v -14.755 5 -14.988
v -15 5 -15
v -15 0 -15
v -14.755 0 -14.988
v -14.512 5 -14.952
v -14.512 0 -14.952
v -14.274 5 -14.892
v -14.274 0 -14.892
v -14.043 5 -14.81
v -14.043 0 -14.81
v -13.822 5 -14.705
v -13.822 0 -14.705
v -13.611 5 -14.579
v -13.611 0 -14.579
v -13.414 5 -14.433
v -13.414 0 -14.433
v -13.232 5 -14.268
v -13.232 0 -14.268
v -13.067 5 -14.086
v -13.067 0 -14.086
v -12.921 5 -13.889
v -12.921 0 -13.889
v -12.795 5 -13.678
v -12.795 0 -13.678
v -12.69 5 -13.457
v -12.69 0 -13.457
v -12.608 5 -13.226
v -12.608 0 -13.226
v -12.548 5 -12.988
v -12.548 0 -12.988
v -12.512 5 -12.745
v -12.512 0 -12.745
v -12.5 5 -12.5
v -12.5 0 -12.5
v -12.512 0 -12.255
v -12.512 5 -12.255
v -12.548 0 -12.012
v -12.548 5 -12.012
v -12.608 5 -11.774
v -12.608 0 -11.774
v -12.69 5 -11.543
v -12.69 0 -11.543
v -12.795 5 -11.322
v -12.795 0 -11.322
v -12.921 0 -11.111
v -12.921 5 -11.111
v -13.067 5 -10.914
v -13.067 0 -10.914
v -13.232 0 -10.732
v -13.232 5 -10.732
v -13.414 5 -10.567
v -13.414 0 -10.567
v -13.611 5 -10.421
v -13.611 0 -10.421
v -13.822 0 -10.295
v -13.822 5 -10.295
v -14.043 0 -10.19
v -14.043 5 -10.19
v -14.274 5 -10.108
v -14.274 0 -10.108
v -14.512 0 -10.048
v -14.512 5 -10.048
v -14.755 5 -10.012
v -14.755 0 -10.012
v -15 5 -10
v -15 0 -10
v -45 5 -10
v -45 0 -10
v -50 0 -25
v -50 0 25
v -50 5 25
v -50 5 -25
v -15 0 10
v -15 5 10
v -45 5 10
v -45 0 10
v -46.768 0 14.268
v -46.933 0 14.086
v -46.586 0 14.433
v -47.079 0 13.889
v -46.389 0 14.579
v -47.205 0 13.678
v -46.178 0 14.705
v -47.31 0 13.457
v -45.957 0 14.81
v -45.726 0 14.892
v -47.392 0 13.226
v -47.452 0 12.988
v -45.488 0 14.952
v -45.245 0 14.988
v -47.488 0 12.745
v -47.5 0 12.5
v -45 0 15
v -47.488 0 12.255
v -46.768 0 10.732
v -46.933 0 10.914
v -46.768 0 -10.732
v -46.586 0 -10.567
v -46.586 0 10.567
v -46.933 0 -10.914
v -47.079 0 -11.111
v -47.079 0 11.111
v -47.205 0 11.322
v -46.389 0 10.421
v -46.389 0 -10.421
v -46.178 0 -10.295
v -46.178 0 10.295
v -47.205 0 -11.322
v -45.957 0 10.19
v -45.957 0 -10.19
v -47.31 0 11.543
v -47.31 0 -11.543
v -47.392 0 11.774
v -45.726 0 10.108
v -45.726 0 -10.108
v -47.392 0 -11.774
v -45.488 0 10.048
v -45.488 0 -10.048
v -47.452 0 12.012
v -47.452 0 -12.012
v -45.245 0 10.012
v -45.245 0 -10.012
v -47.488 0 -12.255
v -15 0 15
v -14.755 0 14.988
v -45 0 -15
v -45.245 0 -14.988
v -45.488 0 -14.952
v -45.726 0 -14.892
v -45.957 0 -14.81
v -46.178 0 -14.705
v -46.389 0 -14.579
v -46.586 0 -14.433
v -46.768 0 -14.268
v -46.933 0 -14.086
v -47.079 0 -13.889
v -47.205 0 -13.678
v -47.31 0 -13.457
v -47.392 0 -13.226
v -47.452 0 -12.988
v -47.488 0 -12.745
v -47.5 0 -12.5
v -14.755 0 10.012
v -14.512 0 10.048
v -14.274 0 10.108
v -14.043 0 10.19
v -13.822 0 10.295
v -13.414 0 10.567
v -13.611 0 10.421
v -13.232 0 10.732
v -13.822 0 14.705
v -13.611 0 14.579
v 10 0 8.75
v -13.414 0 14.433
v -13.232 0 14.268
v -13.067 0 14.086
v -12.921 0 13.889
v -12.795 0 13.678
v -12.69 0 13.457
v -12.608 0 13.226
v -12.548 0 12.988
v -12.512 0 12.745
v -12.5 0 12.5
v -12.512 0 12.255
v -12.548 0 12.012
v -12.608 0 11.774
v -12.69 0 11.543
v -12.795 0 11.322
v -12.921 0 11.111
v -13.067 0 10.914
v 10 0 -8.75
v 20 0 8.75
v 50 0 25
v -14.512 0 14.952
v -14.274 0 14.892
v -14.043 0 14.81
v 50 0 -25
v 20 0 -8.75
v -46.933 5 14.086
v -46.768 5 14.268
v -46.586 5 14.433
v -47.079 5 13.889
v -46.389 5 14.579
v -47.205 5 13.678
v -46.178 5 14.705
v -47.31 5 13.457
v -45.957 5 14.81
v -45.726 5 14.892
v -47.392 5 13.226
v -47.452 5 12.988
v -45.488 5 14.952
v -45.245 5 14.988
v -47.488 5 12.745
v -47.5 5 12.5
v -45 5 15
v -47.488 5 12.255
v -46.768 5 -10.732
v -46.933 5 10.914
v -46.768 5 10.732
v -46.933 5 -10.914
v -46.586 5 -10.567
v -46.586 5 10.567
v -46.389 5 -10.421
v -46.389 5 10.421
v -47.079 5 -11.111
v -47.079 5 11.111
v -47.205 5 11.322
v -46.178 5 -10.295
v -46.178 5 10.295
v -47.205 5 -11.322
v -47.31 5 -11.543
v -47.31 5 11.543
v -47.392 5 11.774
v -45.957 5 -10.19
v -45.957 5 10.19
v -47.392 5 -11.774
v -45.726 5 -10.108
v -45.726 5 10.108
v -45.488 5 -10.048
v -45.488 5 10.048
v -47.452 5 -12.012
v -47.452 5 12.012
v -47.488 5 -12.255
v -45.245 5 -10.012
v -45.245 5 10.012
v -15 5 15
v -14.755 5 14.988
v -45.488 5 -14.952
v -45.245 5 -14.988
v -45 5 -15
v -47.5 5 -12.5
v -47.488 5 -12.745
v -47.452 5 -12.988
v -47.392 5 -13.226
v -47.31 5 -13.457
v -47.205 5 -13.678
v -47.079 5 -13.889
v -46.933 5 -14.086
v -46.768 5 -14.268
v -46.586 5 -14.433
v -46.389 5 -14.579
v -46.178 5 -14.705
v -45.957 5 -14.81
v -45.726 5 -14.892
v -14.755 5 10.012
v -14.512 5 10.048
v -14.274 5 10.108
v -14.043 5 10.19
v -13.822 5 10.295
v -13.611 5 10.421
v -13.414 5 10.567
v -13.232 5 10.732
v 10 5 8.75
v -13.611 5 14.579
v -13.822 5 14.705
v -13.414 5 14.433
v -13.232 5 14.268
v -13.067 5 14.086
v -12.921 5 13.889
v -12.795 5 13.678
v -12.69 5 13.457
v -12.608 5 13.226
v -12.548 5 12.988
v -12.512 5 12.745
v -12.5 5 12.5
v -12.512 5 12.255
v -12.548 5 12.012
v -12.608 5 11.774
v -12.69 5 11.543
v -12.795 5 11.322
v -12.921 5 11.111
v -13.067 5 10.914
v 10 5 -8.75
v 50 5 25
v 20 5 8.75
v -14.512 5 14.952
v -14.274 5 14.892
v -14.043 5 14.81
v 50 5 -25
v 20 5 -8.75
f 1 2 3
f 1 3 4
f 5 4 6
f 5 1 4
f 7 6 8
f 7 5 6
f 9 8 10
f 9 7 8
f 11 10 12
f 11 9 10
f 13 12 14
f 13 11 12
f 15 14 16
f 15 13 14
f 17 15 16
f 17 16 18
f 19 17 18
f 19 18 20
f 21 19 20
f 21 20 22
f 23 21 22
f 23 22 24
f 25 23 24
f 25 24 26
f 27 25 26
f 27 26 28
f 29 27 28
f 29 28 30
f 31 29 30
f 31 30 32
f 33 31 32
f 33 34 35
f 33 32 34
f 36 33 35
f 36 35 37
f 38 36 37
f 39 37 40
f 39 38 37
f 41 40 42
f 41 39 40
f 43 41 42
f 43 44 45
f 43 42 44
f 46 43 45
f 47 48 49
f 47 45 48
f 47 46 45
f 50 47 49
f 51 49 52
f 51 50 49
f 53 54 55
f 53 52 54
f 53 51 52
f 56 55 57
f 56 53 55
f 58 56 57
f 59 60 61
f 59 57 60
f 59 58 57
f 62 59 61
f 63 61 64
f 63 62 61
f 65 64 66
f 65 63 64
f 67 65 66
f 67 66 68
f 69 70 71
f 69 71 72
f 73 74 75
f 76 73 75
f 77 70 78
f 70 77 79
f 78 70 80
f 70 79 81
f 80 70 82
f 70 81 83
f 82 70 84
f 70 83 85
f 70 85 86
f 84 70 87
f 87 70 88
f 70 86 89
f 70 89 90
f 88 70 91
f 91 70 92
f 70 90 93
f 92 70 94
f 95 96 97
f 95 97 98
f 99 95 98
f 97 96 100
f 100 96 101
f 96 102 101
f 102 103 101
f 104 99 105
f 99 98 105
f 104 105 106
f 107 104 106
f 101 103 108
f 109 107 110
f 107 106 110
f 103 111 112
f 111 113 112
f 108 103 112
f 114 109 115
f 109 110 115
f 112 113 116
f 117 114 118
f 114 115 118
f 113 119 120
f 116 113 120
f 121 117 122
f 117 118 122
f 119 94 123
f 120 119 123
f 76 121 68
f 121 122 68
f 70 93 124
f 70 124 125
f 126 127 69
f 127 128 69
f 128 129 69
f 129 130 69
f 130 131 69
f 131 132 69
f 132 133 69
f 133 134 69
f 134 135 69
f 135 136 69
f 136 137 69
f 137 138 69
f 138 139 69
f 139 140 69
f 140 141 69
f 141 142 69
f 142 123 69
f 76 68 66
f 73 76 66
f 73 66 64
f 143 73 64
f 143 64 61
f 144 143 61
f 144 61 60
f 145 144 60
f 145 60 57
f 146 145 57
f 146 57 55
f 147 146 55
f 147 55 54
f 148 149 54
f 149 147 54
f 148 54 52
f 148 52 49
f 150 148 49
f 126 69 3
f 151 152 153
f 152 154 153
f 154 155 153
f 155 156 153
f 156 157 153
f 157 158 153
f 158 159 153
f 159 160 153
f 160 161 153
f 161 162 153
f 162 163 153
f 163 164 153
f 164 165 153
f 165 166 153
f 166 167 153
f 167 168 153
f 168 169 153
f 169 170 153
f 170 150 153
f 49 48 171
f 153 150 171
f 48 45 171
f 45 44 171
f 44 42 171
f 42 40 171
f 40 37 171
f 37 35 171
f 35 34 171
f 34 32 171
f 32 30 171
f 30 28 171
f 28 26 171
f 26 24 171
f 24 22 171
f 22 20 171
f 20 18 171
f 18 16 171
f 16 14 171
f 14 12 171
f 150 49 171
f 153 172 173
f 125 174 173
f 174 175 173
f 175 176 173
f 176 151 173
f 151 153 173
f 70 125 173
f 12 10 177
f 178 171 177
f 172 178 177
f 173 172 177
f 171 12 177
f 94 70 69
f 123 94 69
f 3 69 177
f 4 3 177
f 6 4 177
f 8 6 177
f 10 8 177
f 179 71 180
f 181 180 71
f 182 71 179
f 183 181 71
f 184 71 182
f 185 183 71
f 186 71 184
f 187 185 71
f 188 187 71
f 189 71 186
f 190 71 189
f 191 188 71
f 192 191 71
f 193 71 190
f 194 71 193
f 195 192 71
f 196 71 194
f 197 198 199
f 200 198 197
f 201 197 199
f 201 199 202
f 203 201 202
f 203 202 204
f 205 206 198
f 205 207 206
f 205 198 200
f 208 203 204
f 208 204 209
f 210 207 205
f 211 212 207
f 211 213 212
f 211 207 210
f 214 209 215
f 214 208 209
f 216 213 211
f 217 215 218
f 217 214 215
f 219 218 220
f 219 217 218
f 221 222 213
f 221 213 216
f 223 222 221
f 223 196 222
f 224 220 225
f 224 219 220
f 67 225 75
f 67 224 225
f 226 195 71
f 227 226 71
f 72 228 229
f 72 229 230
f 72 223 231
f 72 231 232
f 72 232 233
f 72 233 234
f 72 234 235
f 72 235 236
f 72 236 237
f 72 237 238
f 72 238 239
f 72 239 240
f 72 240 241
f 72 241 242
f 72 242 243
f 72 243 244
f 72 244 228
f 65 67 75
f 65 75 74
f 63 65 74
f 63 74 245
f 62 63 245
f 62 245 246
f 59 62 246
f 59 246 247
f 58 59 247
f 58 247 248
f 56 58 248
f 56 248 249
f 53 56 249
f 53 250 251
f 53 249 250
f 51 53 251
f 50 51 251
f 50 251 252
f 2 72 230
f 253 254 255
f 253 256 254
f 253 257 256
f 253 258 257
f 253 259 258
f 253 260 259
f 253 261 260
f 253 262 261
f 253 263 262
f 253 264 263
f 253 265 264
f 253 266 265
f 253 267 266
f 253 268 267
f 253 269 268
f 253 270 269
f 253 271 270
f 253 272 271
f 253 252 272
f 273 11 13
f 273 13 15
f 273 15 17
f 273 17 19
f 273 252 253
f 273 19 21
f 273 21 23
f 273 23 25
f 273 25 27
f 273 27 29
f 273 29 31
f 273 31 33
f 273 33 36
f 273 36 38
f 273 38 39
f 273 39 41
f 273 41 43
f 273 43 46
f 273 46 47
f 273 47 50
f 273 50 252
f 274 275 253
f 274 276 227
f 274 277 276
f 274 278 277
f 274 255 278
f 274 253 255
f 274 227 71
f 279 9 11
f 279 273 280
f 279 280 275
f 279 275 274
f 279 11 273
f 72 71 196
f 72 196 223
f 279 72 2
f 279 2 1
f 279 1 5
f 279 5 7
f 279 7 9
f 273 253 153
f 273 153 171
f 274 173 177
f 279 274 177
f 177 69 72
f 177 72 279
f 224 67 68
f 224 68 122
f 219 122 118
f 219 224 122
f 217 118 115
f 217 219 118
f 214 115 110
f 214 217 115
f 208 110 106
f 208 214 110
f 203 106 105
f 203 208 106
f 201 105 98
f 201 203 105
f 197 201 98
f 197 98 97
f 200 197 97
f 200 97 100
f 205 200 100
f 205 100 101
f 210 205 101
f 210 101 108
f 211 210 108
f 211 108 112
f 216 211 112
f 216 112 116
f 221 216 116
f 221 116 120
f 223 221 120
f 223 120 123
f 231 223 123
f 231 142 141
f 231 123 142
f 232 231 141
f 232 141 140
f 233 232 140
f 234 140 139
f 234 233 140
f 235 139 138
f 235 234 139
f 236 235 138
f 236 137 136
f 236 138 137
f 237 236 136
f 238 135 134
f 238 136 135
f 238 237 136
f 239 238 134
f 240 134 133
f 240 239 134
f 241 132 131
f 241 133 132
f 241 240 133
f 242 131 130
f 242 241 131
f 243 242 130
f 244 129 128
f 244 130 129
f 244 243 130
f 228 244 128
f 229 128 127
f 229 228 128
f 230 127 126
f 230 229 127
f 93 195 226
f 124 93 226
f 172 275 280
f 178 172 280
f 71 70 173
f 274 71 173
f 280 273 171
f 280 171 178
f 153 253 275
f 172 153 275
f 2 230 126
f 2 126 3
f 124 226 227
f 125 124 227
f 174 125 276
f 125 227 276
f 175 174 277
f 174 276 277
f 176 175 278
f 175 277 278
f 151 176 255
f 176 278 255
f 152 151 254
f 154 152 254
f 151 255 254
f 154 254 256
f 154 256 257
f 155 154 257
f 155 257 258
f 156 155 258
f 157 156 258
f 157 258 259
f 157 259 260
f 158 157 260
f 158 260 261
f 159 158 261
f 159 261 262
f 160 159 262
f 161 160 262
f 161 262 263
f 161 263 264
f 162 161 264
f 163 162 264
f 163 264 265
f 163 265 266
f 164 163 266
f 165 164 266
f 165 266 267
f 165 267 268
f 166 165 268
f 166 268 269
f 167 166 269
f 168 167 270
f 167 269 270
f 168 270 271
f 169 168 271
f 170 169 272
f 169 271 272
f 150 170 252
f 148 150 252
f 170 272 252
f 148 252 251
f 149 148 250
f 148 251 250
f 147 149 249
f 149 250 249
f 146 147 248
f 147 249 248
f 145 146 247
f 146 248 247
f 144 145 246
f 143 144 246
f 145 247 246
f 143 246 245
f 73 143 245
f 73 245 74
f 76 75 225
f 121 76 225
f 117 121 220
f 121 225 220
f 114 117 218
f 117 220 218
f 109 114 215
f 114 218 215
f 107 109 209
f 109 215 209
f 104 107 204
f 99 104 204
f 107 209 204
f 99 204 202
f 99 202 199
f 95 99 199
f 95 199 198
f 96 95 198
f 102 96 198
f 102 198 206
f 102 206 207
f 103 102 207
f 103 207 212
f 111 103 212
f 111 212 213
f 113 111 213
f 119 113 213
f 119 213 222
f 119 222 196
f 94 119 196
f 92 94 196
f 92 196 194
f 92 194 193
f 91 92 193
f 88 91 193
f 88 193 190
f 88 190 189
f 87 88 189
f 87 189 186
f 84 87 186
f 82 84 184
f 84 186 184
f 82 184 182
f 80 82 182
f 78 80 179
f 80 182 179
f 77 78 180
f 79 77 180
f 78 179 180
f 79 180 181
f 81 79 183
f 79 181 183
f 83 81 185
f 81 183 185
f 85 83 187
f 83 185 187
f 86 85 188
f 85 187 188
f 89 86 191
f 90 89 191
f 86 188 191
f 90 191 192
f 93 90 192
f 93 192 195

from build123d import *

# Parameters (mm, degrees)
SKETCH2_W           = 100
SKETCH2_H           = 50
BOSS_EXTRUDE1_DEPTH = 5
SKETCH3_W           = 10
SKETCH3_H           = 17.5
CUT_EXTRUDE1_DEPTH  = 7.5
CUT_EXTRUDE2_DEPTH  = 7.5


with BuildPart() as part:
    # Sketch2 → Boss-Extrude1 (new body)
    with BuildSketch(Plane(origin=(0, 0, 0), x_dir=(1, 0, 0), z_dir=(0, 1, 0))):
        Rectangle(SKETCH2_W, SKETCH2_H)
    extrude(amount=BOSS_EXTRUDE1_DEPTH)

    # Sketch3 → Cut-Extrude1 (cut)
    with BuildSketch(Plane(origin=(0, 5, 0), x_dir=(1, 0, 0), z_dir=(0, 1, 0))):
        with Locations((15, 0)):
            Rectangle(SKETCH3_W, SKETCH3_H)
    extrude(amount=-CUT_EXTRUDE1_DEPTH, mode=Mode.SUBTRACT)

    # Sketch4 → Cut-Extrude2 (cut)
    with BuildSketch(Plane(origin=(0, 5, 0), x_dir=(1, 0, 0), z_dir=(0, 1, 0))):
        with BuildLine():
            Line((-45, 15), (-15, 15))
            ThreePointArc((-15, 15), (-12.5, 12.5), (-15, 10))
            Line((-15, 10), (-45, 10))
            ThreePointArc((-45, 10), (-47.5, 12.5), (-45, 15))
        make_face()
        with BuildLine():
            Line((-45, -15), (-15, -15))
            ThreePointArc((-15, -15), (-12.5, -12.5), (-15, -10))
            Line((-15, -10), (-45, -10))
            ThreePointArc((-45, -10), (-47.5, -12.5), (-45, -15))
        make_face()
    extrude(amount=-CUT_EXTRUDE2_DEPTH, mode=Mode.SUBTRACT)


solid = part.part
